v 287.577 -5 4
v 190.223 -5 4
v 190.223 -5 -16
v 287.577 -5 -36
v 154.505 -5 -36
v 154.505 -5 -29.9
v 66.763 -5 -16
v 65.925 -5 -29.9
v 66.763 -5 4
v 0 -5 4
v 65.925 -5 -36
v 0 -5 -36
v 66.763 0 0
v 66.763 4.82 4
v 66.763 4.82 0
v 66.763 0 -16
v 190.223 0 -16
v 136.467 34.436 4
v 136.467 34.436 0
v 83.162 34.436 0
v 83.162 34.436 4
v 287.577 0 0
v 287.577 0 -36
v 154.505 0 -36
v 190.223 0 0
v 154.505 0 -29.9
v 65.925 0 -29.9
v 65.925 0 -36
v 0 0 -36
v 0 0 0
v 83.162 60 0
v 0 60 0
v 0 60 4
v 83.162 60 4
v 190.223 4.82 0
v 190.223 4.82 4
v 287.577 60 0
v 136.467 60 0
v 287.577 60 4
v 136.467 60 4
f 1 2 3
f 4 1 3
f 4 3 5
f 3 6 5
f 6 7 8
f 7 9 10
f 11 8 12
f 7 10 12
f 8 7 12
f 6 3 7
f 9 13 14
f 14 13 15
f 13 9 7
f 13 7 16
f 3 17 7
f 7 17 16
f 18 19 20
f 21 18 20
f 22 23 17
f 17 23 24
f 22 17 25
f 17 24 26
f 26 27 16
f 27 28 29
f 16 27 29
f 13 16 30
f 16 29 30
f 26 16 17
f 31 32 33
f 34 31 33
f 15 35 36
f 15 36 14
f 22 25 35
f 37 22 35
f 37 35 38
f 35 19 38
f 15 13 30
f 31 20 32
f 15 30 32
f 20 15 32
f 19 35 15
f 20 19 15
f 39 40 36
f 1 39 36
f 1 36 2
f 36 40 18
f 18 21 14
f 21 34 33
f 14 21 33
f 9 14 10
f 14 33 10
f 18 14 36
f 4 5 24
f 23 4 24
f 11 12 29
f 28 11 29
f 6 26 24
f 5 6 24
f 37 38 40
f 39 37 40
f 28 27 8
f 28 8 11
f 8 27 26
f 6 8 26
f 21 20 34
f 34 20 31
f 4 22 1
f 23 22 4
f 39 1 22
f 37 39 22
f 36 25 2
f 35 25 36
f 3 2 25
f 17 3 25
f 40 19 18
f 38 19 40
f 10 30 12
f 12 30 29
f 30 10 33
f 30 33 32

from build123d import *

# Parameters (mm, degrees)
EXTRUDE_1_DEPTH     = 287.576527547
CUT_EXTRUDE_START   = -20
SKETCH_2_W          = 123.460031058
SKETCH_2_H          = 15.574638679
CUT_EXTRUDE_1_DEPTH = 277.47977873
SKETCH_3_W          = 53.30442173
SKETCH_3_H          = 30.05092592
CUT_EXTRUDE_2_DEPTH = 40
SKETCH_4_W          = 88.57938219
SKETCH_4_H          = 6.982300606
CUT_EXTRUDE_3_DEPTH = 296.966652169


with BuildPart() as part:
    # Эскиз1 → Вытянуть1 (new body)
    with BuildSketch(Plane(origin=(0, 0, 0), x_dir=(0, 0, -1), z_dir=(1, 0, 0))):
        Polygon((0, 0), (0, 60), (-4, 60), (-4, -5), (36, -5), (36, 0), align=None)
    extrude(amount=EXTRUDE_1_DEPTH)

    # Эскиз2 → Вырез-Вытянуть1 (cut, through all)
    with BuildSketch(Plane(origin=(0, 0, -36), x_dir=(-1, 0, 0), z_dir=(0, 0, -1)).offset(CUT_EXTRUDE_START)):
        with Locations((-128.492748506, -2.9676861)):
            Rectangle(SKETCH_2_W, SKETCH_2_H)
    extrude(amount=-CUT_EXTRUDE_1_DEPTH, mode=Mode.SUBTRACT)

    # Эскиз3 → Вырез-Вытянуть2 (cut)
    with BuildSketch(Plane(origin=(0, 0, 0), x_dir=(-1, 0, 0), z_dir=(0, 0, -1))):
        with Locations((-109.814559779, 49.461309937)):
            Rectangle(SKETCH_3_W, SKETCH_3_H)
    extrude(amount=-CUT_EXTRUDE_2_DEPTH, mode=Mode.SUBTRACT)

    # Эскиз4 → Вырез-Вытянуть3 (cut, through all)
    with BuildSketch(Plane(origin=(0, 0, 0), x_dir=(1, 0, 0), z_dir=(0, 1, 0))):
        with Locations((110.214944544, 33.390941069)):
            Rectangle(SKETCH_4_W, SKETCH_4_H)
    extrude(amount=-CUT_EXTRUDE_3_DEPTH, mode=Mode.SUBTRACT)


solid = part.part
